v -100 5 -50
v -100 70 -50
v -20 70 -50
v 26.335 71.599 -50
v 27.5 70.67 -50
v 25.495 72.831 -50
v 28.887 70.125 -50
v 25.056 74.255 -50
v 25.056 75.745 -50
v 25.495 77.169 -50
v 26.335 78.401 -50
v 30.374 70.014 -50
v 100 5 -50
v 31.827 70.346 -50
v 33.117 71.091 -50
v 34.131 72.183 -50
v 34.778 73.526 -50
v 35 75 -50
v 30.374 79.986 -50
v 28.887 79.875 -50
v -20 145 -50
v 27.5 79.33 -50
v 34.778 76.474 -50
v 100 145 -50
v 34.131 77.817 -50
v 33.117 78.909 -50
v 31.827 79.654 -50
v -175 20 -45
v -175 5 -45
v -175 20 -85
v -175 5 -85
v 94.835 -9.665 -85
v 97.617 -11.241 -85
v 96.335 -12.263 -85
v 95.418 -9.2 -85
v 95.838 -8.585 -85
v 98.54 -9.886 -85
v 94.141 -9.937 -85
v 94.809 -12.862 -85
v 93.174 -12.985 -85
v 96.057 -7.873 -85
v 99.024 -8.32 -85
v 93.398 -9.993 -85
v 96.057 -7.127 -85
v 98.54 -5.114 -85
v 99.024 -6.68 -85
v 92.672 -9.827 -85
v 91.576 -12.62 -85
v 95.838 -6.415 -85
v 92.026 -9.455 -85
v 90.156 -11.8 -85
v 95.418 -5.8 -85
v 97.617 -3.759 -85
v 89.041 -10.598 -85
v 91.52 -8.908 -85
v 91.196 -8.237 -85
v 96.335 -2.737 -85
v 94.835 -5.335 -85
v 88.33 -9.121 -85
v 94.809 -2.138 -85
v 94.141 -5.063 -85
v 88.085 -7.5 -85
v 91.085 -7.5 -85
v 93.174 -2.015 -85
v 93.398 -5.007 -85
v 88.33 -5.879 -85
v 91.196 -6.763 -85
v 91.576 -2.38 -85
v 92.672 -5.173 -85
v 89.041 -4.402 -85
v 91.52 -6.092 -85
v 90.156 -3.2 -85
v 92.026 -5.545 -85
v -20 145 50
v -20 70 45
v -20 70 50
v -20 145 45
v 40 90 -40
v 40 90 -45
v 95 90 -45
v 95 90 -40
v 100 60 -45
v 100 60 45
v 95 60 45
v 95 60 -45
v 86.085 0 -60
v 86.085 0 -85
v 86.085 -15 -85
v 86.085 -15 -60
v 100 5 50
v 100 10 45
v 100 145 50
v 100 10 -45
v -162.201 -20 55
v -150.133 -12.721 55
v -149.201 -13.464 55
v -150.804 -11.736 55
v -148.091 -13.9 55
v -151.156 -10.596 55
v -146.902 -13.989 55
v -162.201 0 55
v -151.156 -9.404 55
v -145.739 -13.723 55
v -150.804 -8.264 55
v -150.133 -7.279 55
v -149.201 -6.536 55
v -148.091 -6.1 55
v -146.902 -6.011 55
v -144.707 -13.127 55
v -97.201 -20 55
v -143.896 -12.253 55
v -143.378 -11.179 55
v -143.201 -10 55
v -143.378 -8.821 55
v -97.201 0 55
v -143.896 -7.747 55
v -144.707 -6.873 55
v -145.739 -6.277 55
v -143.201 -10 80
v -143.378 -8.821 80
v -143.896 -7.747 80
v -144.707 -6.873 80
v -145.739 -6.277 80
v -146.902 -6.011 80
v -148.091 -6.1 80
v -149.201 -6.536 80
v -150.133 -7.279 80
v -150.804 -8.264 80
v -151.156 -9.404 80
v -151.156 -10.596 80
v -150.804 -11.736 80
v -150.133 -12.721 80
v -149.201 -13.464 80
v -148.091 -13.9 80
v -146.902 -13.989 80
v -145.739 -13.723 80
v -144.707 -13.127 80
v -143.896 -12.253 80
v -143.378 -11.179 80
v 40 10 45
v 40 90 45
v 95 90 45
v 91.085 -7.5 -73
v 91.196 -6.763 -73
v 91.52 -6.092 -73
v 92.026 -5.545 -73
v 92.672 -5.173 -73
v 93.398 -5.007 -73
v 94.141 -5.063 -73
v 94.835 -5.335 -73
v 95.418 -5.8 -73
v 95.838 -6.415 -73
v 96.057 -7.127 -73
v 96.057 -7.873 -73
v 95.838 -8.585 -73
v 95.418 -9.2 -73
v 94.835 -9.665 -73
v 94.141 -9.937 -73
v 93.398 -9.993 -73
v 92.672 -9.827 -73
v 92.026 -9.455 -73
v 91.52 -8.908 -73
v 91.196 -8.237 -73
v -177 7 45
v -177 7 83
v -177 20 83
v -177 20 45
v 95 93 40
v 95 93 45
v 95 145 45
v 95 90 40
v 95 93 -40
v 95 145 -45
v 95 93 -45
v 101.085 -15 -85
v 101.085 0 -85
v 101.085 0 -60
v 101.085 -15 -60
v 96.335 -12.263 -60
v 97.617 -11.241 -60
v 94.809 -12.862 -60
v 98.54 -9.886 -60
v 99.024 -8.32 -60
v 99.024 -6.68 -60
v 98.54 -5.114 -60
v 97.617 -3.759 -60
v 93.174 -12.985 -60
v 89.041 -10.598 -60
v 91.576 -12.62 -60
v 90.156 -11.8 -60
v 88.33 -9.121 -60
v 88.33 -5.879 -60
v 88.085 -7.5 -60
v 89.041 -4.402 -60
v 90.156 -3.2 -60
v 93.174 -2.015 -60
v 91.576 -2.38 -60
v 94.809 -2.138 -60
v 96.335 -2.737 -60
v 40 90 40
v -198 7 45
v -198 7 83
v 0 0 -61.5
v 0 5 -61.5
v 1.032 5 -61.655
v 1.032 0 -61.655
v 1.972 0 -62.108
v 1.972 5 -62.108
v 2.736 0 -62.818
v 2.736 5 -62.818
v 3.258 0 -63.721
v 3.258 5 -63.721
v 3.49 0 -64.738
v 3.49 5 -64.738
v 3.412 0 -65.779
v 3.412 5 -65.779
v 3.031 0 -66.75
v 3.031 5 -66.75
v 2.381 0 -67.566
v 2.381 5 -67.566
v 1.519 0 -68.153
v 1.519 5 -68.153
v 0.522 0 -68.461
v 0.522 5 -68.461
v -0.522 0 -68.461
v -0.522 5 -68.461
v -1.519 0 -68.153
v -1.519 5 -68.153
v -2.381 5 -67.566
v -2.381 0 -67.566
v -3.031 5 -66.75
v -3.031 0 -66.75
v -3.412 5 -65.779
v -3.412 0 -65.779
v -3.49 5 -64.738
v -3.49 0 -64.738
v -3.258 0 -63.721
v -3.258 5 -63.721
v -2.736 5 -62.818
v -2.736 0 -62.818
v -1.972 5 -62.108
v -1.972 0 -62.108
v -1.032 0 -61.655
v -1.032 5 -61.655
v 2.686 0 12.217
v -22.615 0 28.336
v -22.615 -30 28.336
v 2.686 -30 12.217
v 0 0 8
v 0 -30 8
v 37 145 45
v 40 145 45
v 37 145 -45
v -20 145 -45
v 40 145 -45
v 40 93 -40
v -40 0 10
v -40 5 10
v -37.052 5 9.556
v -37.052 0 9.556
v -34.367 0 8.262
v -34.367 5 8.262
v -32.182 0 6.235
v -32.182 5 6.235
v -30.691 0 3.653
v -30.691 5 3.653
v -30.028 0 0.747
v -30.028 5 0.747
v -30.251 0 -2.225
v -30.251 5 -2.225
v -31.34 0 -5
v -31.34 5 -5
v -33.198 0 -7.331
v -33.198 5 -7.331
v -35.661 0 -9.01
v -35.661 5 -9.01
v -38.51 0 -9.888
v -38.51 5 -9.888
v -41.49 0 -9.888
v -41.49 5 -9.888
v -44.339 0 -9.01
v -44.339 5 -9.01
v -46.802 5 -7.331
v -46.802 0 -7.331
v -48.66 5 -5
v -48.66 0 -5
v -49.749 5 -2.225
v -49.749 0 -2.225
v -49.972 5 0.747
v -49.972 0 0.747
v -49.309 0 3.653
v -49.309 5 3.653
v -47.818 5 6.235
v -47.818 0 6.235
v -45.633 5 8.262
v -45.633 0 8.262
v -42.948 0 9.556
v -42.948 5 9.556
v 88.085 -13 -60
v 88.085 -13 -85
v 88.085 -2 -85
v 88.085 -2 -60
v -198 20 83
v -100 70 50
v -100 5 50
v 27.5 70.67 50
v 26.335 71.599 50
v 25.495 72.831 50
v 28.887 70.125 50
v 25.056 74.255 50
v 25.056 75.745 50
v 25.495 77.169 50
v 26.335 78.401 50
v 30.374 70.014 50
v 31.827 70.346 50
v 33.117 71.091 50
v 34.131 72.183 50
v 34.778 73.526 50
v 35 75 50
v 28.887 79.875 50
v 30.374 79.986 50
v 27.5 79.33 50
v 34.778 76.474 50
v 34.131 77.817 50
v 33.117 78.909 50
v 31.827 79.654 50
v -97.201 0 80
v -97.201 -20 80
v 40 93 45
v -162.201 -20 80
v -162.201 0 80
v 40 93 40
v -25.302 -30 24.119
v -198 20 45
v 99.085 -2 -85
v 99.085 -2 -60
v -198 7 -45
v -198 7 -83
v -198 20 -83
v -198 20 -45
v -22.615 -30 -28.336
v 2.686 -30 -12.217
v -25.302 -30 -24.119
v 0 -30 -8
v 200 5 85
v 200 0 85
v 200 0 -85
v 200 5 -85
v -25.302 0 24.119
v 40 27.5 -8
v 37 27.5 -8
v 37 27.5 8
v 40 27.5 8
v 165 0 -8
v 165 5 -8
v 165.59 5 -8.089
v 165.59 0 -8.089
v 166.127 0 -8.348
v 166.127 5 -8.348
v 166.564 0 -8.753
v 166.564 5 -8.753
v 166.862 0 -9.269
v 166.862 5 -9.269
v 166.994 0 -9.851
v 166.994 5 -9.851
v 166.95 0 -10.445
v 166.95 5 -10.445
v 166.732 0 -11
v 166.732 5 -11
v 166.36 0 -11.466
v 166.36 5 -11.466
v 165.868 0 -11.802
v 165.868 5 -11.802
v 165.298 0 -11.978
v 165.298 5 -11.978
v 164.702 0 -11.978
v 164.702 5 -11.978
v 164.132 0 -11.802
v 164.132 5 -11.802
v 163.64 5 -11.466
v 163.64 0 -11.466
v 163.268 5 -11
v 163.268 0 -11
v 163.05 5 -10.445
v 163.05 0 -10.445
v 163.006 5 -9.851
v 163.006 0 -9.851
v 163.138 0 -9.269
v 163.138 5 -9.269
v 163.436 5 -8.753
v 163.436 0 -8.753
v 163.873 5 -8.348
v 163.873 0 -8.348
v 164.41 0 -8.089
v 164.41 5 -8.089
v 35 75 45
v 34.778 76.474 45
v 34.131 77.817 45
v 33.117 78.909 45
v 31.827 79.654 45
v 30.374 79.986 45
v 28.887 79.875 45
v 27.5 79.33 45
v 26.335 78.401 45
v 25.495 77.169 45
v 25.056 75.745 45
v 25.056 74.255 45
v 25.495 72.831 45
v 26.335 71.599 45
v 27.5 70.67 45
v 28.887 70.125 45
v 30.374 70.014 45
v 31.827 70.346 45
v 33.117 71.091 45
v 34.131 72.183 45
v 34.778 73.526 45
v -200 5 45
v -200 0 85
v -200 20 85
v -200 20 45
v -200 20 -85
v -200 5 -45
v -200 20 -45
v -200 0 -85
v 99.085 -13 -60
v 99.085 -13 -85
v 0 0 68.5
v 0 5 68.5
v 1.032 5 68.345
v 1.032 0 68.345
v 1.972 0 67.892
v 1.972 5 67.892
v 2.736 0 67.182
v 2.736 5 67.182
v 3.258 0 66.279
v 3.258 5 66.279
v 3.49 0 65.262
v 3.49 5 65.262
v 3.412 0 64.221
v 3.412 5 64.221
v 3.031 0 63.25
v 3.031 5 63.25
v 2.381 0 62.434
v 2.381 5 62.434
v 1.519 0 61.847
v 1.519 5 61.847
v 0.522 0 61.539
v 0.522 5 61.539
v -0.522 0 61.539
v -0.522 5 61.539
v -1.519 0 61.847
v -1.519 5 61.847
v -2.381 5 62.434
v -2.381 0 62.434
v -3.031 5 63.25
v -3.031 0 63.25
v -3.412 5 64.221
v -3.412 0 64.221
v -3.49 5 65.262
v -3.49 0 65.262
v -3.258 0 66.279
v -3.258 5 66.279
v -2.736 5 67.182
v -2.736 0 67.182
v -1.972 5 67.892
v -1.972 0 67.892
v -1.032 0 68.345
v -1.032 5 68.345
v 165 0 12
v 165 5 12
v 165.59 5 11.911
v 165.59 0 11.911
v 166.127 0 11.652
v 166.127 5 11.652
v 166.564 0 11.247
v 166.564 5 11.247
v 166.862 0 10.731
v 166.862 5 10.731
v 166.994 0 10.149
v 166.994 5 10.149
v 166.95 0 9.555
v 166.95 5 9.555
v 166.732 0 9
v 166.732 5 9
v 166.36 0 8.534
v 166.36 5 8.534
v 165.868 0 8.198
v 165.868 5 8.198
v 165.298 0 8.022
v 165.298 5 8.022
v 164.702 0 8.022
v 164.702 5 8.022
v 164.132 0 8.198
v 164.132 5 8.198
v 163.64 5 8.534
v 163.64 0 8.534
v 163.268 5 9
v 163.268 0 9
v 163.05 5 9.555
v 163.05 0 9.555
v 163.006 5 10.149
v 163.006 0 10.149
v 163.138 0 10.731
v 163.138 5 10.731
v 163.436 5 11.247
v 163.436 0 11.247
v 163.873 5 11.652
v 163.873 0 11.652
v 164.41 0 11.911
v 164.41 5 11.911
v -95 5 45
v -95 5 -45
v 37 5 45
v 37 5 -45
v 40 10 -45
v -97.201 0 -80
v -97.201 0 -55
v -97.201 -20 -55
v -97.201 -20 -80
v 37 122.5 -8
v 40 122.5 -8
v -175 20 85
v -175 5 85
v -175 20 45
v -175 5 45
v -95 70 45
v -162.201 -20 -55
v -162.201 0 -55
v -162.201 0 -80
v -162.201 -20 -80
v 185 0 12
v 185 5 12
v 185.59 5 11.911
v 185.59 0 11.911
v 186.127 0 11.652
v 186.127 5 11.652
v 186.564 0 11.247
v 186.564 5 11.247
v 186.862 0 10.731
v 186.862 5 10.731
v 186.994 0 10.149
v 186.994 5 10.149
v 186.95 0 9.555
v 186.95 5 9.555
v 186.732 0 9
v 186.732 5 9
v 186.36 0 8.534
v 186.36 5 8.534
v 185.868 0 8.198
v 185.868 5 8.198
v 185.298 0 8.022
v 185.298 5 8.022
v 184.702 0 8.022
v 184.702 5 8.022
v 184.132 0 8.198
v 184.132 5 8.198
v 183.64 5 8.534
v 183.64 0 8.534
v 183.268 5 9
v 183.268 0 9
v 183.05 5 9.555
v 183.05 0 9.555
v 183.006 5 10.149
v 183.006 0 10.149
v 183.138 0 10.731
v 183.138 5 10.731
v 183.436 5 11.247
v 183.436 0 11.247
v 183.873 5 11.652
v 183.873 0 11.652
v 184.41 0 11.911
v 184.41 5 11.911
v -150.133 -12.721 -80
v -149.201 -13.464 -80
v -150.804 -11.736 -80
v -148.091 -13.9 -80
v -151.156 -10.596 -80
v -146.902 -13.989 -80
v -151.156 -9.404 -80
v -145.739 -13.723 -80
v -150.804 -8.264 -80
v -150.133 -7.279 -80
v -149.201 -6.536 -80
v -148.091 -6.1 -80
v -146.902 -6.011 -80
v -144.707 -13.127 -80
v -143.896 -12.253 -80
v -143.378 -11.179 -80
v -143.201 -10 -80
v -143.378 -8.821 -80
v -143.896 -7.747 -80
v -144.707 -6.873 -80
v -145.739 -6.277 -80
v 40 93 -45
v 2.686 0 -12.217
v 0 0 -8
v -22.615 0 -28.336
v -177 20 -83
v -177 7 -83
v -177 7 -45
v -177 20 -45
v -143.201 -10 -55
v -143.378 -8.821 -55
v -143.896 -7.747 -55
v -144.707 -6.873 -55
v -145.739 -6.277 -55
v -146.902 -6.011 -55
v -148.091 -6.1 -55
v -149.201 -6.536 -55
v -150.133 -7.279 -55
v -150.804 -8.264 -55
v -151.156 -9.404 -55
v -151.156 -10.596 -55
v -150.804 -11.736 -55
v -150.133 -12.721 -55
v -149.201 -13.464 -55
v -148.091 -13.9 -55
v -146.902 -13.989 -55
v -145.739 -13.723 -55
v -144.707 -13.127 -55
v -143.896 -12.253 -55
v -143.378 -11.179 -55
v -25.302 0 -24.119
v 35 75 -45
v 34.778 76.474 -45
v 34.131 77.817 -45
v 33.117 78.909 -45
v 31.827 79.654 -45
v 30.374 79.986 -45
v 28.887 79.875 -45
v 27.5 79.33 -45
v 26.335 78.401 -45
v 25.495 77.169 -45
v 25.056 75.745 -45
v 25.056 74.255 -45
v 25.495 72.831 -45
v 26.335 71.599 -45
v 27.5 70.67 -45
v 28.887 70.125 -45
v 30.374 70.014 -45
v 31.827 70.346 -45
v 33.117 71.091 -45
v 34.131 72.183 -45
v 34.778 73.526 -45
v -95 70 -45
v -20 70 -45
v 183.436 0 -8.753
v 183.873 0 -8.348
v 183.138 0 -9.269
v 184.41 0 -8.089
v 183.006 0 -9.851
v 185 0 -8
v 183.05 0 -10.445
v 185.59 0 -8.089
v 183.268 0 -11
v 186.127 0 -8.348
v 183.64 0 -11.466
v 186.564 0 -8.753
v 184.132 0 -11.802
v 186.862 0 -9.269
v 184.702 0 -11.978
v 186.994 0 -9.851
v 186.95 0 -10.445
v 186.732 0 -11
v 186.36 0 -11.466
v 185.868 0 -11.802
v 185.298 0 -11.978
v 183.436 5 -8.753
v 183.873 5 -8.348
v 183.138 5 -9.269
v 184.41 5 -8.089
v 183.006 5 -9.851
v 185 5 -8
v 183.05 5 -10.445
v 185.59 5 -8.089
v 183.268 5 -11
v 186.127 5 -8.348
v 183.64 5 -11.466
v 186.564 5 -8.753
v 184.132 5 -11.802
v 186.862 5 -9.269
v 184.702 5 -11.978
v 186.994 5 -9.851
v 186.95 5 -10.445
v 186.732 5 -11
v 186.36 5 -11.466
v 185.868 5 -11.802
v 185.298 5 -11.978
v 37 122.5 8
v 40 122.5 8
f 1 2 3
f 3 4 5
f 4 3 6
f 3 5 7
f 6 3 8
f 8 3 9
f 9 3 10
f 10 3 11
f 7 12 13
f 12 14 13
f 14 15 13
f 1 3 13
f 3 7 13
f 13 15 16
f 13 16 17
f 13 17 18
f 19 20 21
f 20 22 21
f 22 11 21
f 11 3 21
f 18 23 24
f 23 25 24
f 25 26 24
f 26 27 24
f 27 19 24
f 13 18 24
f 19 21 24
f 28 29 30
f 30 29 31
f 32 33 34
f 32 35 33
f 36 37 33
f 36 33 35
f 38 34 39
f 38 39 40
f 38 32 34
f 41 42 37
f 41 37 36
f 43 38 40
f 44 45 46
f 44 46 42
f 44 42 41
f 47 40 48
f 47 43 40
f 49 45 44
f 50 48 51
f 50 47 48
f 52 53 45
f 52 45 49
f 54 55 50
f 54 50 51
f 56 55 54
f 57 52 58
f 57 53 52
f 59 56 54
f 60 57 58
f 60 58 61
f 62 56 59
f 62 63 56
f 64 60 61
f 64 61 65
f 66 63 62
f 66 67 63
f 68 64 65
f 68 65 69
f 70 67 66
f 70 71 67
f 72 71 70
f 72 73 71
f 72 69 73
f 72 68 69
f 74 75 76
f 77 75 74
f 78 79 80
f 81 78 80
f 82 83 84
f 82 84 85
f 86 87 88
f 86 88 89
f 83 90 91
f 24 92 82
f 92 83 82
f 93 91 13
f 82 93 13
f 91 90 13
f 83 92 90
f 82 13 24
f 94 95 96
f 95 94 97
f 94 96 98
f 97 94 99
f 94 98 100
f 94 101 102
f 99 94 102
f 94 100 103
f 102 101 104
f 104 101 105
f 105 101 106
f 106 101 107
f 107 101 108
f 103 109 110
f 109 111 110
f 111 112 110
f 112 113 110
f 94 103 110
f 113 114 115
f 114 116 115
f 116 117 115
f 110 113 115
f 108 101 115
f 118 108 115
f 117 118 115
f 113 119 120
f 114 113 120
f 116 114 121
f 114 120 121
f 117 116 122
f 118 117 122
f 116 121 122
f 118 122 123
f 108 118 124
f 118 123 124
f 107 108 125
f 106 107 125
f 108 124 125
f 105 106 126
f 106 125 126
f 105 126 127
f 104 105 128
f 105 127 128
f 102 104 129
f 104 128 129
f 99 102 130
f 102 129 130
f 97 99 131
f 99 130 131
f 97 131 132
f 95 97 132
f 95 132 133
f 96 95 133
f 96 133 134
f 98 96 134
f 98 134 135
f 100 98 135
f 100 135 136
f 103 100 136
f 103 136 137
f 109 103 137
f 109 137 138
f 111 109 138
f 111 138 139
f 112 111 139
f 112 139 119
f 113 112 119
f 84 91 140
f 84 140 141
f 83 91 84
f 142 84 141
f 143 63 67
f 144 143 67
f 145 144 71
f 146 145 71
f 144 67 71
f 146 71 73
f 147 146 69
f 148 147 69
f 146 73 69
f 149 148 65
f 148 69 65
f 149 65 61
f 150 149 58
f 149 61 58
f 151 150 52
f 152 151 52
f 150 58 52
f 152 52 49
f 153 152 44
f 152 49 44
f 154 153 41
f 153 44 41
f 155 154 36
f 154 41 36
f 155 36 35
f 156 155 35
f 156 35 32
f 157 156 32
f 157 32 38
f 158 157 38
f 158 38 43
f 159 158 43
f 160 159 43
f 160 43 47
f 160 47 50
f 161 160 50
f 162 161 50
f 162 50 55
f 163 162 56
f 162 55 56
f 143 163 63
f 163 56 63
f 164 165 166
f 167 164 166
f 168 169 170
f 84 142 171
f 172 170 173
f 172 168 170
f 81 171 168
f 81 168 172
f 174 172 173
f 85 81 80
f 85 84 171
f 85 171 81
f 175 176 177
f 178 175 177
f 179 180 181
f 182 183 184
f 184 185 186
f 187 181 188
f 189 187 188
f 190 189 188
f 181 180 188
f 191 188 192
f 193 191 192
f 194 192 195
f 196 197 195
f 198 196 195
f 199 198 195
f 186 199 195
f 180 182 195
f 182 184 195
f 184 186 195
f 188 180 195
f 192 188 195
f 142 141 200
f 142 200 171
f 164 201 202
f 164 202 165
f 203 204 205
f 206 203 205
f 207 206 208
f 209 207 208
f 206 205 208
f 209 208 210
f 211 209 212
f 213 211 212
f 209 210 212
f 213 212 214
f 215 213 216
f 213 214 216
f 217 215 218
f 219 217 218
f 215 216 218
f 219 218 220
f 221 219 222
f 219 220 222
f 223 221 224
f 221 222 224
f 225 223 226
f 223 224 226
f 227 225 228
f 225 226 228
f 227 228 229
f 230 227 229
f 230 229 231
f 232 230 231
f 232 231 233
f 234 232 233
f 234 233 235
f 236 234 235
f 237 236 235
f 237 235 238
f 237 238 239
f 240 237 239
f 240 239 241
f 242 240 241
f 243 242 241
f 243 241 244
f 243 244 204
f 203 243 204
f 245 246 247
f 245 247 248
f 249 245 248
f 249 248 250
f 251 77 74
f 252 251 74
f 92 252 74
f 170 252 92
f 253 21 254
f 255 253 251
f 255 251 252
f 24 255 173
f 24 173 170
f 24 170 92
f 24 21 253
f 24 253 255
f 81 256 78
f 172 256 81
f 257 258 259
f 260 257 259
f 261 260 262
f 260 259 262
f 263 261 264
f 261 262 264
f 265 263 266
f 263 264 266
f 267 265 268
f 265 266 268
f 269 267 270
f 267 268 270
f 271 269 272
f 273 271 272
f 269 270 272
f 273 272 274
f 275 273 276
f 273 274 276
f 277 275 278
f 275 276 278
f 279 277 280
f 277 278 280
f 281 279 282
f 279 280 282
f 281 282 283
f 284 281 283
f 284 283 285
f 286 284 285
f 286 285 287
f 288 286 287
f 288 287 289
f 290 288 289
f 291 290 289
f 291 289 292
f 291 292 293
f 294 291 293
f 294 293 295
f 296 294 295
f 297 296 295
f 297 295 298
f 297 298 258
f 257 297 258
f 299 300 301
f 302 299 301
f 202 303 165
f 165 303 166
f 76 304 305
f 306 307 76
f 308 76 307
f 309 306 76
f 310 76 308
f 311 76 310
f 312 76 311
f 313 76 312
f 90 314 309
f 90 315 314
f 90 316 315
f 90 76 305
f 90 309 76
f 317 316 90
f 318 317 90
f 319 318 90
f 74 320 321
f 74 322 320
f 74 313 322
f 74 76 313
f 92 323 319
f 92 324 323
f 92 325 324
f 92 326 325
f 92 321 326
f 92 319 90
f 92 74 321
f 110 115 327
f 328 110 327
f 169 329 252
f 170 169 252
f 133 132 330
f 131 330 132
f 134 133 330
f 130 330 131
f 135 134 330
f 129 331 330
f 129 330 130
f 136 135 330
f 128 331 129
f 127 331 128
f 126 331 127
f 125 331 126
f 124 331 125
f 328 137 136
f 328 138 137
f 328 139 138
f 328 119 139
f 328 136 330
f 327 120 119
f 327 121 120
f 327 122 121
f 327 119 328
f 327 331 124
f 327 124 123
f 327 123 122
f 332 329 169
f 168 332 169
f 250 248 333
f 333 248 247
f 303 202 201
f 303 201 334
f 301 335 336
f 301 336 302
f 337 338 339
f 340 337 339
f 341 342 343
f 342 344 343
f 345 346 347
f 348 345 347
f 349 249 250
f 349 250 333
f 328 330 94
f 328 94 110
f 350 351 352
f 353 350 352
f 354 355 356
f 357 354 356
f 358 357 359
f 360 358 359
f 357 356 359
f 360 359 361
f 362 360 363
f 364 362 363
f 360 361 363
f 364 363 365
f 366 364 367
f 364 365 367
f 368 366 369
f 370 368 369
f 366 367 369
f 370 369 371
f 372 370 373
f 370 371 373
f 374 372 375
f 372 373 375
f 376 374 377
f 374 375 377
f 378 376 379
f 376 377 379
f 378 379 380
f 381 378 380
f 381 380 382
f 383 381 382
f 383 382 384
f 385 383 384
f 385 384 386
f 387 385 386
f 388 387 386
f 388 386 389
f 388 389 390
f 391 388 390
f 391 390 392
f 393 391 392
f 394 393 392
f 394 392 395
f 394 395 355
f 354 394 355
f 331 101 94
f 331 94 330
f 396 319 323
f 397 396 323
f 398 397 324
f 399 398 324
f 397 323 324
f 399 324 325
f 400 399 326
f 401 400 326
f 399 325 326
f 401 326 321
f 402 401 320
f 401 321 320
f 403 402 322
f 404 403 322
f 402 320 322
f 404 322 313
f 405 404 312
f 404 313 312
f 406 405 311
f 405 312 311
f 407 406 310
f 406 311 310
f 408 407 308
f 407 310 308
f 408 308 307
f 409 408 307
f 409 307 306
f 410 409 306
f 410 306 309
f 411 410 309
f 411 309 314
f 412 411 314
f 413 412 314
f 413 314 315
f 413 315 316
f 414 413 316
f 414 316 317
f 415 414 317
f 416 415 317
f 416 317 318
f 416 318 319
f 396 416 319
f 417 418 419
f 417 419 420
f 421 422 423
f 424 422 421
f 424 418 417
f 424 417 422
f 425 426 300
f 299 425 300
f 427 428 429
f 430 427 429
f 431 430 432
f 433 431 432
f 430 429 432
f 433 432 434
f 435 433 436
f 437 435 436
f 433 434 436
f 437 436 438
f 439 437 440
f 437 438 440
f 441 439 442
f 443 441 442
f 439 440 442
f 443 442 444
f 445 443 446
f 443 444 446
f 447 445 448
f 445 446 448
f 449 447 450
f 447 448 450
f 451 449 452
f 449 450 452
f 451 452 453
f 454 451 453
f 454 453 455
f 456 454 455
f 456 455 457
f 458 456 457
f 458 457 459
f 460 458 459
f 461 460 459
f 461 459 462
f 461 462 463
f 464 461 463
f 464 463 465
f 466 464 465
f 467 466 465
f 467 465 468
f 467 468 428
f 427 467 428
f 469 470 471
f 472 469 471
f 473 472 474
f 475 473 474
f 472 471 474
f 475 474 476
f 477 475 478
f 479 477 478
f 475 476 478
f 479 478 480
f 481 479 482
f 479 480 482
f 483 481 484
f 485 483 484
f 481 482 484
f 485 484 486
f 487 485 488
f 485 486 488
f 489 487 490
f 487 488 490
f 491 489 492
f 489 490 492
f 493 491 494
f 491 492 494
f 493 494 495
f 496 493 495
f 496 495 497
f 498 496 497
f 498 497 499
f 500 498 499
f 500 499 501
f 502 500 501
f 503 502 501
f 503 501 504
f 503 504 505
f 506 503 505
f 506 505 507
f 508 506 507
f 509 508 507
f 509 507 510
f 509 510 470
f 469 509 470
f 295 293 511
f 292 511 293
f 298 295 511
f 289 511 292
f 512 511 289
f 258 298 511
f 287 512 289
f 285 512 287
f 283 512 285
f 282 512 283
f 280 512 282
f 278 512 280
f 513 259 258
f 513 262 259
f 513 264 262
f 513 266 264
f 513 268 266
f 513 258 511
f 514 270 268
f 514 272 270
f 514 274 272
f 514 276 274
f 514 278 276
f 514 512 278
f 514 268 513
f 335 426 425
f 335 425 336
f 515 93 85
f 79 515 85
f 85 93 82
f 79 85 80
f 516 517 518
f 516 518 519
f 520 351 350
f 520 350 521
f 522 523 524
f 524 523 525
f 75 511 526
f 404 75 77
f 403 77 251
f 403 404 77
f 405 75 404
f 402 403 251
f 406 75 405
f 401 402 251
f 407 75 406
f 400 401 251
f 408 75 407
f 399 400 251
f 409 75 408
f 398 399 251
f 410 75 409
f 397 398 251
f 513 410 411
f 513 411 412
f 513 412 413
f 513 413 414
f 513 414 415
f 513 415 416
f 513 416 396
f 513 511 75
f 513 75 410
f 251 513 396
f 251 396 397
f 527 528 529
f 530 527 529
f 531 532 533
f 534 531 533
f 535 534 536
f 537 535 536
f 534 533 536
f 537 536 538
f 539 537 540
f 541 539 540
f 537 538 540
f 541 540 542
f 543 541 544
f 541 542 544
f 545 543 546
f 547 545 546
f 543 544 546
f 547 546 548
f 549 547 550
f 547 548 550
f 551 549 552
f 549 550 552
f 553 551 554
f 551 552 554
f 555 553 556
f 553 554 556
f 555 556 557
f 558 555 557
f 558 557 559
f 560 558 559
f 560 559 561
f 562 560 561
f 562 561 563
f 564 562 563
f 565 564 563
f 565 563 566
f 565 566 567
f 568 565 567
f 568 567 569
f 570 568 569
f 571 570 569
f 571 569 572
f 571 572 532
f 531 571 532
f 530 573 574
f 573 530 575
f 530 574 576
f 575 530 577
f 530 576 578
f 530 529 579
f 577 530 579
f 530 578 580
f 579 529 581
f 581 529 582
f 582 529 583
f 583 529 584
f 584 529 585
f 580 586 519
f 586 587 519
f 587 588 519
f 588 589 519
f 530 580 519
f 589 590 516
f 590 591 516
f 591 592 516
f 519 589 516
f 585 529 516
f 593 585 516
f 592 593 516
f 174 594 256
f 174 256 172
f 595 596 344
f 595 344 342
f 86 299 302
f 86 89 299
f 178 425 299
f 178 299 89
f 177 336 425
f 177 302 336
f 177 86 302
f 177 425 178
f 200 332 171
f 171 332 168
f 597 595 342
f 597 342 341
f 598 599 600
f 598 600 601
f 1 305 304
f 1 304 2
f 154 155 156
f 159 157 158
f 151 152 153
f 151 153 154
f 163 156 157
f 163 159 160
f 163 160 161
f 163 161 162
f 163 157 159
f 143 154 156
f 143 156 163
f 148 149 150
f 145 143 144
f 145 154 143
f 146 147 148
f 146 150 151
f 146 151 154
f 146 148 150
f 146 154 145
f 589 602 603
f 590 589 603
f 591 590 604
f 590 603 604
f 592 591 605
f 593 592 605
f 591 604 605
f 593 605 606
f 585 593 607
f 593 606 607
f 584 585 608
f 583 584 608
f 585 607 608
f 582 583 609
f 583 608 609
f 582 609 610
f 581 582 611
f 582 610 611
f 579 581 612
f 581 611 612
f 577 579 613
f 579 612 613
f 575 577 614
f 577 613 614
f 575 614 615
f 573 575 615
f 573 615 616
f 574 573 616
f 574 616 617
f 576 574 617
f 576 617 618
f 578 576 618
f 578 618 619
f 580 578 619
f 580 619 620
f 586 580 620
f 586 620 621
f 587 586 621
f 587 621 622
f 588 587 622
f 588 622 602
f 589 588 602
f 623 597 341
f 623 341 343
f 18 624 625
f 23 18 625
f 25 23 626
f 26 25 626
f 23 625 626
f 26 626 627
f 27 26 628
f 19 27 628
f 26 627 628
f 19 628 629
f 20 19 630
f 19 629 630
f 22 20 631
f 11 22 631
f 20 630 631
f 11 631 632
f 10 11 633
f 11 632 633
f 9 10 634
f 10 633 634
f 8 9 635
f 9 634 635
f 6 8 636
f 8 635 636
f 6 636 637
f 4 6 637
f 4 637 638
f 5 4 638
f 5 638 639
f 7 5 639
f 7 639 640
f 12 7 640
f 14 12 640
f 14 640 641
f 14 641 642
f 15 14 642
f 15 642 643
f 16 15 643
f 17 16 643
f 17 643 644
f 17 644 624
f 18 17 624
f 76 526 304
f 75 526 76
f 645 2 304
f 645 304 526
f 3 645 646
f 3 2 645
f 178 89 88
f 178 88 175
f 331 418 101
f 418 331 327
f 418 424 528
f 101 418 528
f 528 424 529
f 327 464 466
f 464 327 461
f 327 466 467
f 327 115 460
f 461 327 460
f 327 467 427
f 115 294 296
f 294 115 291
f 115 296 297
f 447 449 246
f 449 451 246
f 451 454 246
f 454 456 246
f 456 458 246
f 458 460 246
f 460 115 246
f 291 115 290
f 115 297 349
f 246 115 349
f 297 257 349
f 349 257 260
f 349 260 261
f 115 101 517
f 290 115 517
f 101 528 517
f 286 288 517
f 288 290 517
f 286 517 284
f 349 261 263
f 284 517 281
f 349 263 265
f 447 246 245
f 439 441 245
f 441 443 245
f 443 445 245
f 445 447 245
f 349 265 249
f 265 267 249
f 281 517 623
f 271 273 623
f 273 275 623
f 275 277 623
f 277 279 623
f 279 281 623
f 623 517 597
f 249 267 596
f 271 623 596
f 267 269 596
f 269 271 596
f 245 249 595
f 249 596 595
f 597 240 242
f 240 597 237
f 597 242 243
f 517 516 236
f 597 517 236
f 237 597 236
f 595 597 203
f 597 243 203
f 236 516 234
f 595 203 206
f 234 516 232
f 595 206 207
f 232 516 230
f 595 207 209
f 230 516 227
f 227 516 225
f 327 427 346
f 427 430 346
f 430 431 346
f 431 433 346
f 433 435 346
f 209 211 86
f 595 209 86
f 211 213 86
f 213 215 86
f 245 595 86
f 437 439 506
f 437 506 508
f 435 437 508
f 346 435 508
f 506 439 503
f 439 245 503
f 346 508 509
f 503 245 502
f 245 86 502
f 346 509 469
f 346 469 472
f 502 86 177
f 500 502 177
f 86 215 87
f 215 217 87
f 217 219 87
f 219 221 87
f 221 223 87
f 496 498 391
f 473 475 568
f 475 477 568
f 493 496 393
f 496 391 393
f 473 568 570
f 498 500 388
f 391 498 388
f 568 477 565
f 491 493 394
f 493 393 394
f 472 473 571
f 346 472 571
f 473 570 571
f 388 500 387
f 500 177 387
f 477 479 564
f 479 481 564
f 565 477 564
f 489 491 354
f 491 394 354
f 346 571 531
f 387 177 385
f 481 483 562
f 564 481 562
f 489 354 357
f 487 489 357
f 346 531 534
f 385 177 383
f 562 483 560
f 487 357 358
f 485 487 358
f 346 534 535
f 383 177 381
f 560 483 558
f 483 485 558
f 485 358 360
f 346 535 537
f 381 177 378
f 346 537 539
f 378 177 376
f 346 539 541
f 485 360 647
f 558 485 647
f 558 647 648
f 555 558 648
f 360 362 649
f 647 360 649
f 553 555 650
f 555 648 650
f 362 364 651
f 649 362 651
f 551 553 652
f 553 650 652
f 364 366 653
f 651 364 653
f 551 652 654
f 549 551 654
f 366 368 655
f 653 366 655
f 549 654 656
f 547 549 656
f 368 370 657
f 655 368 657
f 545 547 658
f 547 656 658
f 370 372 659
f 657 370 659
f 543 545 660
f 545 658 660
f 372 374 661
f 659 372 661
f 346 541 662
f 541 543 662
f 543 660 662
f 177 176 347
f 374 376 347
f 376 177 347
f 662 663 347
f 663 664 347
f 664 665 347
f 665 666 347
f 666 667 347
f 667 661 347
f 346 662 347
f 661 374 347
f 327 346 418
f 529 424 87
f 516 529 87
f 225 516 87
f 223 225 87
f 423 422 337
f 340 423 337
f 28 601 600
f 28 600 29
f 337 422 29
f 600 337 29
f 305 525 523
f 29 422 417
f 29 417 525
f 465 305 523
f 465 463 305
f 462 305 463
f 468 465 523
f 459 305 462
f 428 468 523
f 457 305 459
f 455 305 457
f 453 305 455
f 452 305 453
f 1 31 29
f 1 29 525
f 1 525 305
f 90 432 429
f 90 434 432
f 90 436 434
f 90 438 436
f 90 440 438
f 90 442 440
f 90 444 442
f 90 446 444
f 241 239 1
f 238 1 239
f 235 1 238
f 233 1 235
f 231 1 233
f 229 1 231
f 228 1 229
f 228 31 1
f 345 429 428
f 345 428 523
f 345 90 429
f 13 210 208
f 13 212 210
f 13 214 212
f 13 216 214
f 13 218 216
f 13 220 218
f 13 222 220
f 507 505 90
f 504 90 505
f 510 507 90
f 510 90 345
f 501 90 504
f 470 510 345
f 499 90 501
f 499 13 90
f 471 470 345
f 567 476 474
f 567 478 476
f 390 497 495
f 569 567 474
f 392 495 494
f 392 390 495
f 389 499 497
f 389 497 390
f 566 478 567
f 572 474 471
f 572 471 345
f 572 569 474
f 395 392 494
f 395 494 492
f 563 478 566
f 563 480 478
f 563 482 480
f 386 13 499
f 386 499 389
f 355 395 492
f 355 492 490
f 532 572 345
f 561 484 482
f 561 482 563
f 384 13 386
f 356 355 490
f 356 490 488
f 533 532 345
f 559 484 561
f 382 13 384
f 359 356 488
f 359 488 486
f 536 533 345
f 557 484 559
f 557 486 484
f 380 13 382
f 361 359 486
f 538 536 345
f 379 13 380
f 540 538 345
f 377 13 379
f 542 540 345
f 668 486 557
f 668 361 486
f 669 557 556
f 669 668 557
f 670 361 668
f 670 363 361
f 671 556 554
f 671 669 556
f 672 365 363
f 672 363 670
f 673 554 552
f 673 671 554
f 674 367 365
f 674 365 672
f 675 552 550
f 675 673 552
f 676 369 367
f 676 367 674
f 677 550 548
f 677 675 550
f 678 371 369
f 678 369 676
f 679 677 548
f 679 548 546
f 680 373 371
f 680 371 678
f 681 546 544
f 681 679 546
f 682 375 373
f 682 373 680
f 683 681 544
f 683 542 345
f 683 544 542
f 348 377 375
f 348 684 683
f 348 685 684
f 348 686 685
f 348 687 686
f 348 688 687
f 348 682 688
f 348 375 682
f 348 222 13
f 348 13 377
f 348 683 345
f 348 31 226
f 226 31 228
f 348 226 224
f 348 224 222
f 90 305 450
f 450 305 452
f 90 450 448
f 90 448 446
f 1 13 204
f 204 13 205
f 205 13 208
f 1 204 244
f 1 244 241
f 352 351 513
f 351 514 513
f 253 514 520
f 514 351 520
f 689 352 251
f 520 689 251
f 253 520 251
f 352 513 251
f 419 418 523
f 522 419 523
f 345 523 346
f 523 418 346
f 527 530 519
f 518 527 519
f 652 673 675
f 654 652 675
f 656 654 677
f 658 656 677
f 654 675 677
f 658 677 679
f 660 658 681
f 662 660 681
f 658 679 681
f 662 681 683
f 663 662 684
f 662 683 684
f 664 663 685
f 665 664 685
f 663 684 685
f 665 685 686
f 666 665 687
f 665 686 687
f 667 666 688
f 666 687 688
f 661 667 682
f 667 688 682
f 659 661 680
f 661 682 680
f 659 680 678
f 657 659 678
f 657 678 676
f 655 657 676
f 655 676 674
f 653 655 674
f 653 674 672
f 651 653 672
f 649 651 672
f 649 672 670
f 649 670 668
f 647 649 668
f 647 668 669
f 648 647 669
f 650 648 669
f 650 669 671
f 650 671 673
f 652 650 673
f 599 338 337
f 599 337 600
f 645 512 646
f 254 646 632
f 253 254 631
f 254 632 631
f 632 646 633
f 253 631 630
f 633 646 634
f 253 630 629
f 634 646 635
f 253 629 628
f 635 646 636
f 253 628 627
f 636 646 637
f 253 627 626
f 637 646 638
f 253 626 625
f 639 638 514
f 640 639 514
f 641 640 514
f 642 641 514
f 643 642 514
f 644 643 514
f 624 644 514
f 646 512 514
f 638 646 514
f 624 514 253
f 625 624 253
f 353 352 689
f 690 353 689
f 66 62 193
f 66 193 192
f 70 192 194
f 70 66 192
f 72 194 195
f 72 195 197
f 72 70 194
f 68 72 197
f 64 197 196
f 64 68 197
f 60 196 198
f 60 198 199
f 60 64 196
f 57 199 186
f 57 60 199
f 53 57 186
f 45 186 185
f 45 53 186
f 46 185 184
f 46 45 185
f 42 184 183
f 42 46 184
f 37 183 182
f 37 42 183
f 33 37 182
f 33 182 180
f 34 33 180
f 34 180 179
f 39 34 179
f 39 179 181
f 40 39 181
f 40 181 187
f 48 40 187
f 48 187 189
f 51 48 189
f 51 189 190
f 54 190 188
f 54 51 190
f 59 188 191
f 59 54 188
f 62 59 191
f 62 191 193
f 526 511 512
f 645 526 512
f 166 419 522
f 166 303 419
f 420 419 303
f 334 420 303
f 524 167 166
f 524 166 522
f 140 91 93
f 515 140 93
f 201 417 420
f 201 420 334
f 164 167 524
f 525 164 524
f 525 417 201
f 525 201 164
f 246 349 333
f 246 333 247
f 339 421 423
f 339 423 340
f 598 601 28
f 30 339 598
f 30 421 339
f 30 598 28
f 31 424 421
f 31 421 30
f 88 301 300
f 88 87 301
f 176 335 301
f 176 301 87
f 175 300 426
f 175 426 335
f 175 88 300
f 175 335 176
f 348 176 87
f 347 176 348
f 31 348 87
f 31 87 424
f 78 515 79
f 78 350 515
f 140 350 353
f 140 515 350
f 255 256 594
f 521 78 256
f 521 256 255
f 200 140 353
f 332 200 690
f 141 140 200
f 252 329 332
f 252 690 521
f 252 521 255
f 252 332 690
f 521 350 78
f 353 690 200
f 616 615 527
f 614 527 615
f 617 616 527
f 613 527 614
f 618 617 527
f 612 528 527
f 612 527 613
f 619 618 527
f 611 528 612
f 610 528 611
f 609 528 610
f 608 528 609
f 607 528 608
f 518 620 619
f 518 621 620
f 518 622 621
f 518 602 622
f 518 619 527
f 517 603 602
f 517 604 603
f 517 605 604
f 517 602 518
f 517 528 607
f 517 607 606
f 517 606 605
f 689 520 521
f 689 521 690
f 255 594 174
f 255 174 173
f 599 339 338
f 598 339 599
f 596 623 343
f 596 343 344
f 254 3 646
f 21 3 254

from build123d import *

# Parameters (mm, degrees)
SKETCH1_W                = 400
SKETCH1_H                = 170
BOSS_EXTRUDE1_DEPTH      = 5
SKETCH2_W                = 200
SKETCH2_H                = 100
BOSS_EXTRUDE2_DEPTH      = 140
SHELL1_START             = 5
SHELL1_OUTLINE_W         = 190
SHELL1_OUTLINE_H         = 90
SHELL1_DEPTH             = 140
CUT_EXTRUDE1_DEPTH       = 282.513765205
CUT_EXTRUDE1_DEPTH_BACK  = 282.513765205
SKETCH3_W                = 80
SKETCH3_H                = 75
SKETCH4_R                = 10
CUT_EXTRUDE2_DEPTH       = 140
SKETCH5_W                = 3
SKETCH5_H                = 140
BOSS_EXTRUDE3_DEPTH      = 95
CUT_EXTRUDE3_REACH       = 292.549
SKETCH6_W                = 16
SKETCH6_H                = 95
SKETCH7_R                = 5
CUT_EXTRUDE4_DEPTH       = 140
SKETCH8_W                = 65
SKETCH8_H                = 25
BOSS_EXTRUDE4_DEPTH      = 20
SKETCH9_R                = 2
CUT_EXTRUDE5_DEPTH       = 20
SKETCH21_R               = 3.5
CUT_EXTRUDE9_DEPTH       = 259.505319094
CUT_EXTRUDE10_REACH      = 299.069
SKETCH22_R               = 4
SKETCH35_W               = 90
SKETCH35_H               = 50
CUT_EXTRUDE14_DEPTH      = 15
SKETCH36_W               = 100
SKETCH36_H               = 5
BOSS_EXTRUDE17_DEPTH     = 60
SKETCH38_W               = 25
SKETCH38_H               = 40
BOSS_EXTRUDE19_DEPTH     = 15
CUT_EXTRUDE15_DEPTH      = 128
CUT_EXTRUDE15_DEPTH_BACK = 38
SKETCH39_W               = 21
SKETCH39_H               = 13
SKETCH41_W               = 55
SKETCH41_H               = 3
BOSS_EXTRUDE20_DEPTH     = 10
BOSS_EXTRUDE21_DEPTH     = 30
SKETCH43_W               = 15
SKETCH43_H               = 25
BOSS_EXTRUDE22_DEPTH     = 15
CUT_EXTRUDE16_REACH      = 301.875
SKETCH44_W               = 11
SKETCH44_H               = 11
SKETCH45_R               = 5.5
BOSS_EXTRUDE23_DEPTH     = 25
SKETCH46_R               = 2.5
CUT_EXTRUDE17_DEPTH      = 12


# Read off the part's stored shape, not the designer's step: Shell1
with BuildPart() as part:
    # Sketch1 → Boss-Extrude1 (new body)
    with BuildSketch(Plane(origin=(0, 0, 0), x_dir=(1, 0, 0), z_dir=(0, 1, 0))):
        Rectangle(SKETCH1_W, SKETCH1_H)
    extrude(amount=BOSS_EXTRUDE1_DEPTH)

    # Sketch2 → Boss-Extrude2 (add)
    with BuildSketch(Plane(origin=(0, 5, 0), x_dir=(1, 0, 0), z_dir=(0, 1, 0))):
        Rectangle(SKETCH2_W, SKETCH2_H)
    extrude(amount=BOSS_EXTRUDE2_DEPTH)

    # Shell1 outline → Shell1 (cut)
    with BuildSketch(Plane(origin=(0, 0, 0), x_dir=(1, 0, 0), z_dir=(0, 1, 0)).offset(SHELL1_START)):
        Rectangle(SHELL1_OUTLINE_W, SHELL1_OUTLINE_H)
    extrude(amount=SHELL1_DEPTH, mode=Mode.SUBTRACT)

    # Sketch3 → Cut-Extrude1 (cut, two sides: drawn at the far end of the back side and taken through both)
    with BuildSketch(Plane.XY.offset(50).offset(-CUT_EXTRUDE1_DEPTH_BACK)):
        with Locations((-60, 107.5)):
            Rectangle(SKETCH3_W, SKETCH3_H)
    extrude(amount=CUT_EXTRUDE1_DEPTH + CUT_EXTRUDE1_DEPTH_BACK, mode=Mode.SUBTRACT)

    # Sketch4 → Cut-Extrude2 (cut)
    with BuildSketch(Plane(origin=(0, 5, 0), x_dir=(1, 0, 0), z_dir=(0, 1, 0))):
        with Locations(Location((-40, 0, 0), (0, 0, 270))):
            Circle(SKETCH4_R)
    extrude(amount=-CUT_EXTRUDE2_DEPTH, mode=Mode.SUBTRACT)

    # Sketch5 → Boss-Extrude3 (add)
    with BuildSketch(Plane.XY.offset(50)):
        with Locations((38.5, 75)):
            Rectangle(SKETCH5_W, SKETCH5_H)
    extrude(amount=-BOSS_EXTRUDE3_DEPTH)

    # Sketch6 → Cut-Extrude3 (cut, up to next)
    with BuildSketch(Plane.ZY.offset(-37), mode=Mode.PRIVATE) as cut_extrude3_sk1:
        with Locations((0, 75)):
            Rectangle(SKETCH6_W, SKETCH6_H)
    cut_extrude3_tool1 = extrude(cut_extrude3_sk1.sketch, amount=-CUT_EXTRUDE3_REACH, mode=Mode.PRIVATE) & part.part
    add(cut_extrude3_tool1.solids().sort_by_distance((37, 75, 0))[0], mode=Mode.SUBTRACT)

    # Sketch7 → Cut-Extrude4 (cut)
    with BuildSketch(Plane.XY.offset(50)):
        with Locations((30, 75)):
            Circle(SKETCH7_R)
    extrude(amount=-CUT_EXTRUDE4_DEPTH, mode=Mode.SUBTRACT)

    # Sketch8 → Boss-Extrude4 (add)
    with BuildSketch(Plane.XZ):
        with Locations((-129.700529479, 67.5)):
            Rectangle(SKETCH8_W, SKETCH8_H)
    boss_extrude4 = extrude(amount=BOSS_EXTRUDE4_DEPTH)

    # Mirror1: Boss-Extrude4 across plane
    add(boss_extrude4.mirror(Plane.XY))

    # Sketch9 → Cut-Extrude5 (cut)
    with BuildSketch(Plane(origin=(0, 5, 0), x_dir=(1, 0, 0), z_dir=(0, 1, 0))):
        with Locations(Location((185, 10, 0), (0, 0, 270))):
            Circle(SKETCH9_R)
        with Locations(Location((185, -10, 0), (0, 0, 270))):
            Circle(SKETCH9_R)
        with Locations(Location((165, -10, 0), (0, 0, 270))):
            Circle(SKETCH9_R)
        with Locations(Location((165, 10, 0), (0, 0, 270))):
            Circle(SKETCH9_R)
    extrude(amount=-CUT_EXTRUDE5_DEPTH, mode=Mode.SUBTRACT)

    # Sketch21 → Cut-Extrude9 (cut, through all)
    with BuildSketch(Plane(origin=(0, 5, 0), x_dir=(1, 0, 0), z_dir=(0, 1, 0))):
        with Locations(Location((0, 65, 0), (0, 0, 270))):
            Circle(SKETCH21_R)
        with Locations(Location((0, -65, 0), (0, 0, 270))):
            Circle(SKETCH21_R)
    extrude(amount=-CUT_EXTRUDE9_DEPTH, mode=Mode.SUBTRACT)

    # Cut-Extrude10: up to this face of the body (flat: up to its plane)
    cut_extrude10_end = Plane(part.part.faces().sort_by_distance((-129.700529479, -10, -80))[0])
    # Sketch22 → Cut-Extrude10 (cut, up to the picked face)
    with BuildSketch(Plane.XY.offset(80), mode=Mode.PRIVATE) as cut_extrude10_sk1:
        with Locations((-147.200529479, -10)):
            Circle(SKETCH22_R)
    cut_extrude10_tool1 = split(extrude(cut_extrude10_sk1.sketch, amount=-CUT_EXTRUDE10_REACH, mode=Mode.PRIVATE), bisect_by=cut_extrude10_end, keep=Keep.BOTH, mode=Mode.PRIVATE)
    add(cut_extrude10_tool1.solids().sort_by(Axis((-147.200529, -10, 80), (0, 0, -1)))[0], mode=Mode.SUBTRACT)

    # Sketch35 → Cut-Extrude14 (cut)
    with BuildSketch(Plane(origin=(100, 0, 0), x_dir=(0, 0, -1), z_dir=(1, 0, 0))):
        with Locations((0, 35)):
            Rectangle(SKETCH35_W, SKETCH35_H)
    extrude(amount=-CUT_EXTRUDE14_DEPTH, mode=Mode.SUBTRACT)

    # Sketch36 → Boss-Extrude17 (add)
    with BuildSketch(Plane(origin=(100, 0, 0), x_dir=(0, 0, -1), z_dir=(1, 0, 0))):
        with Locations((0, 7.5)):
            Rectangle(SKETCH36_W, SKETCH36_H)
    extrude(amount=-BOSS_EXTRUDE17_DEPTH)

    # Sketch38 → Boss-Extrude19 (add)
    with BuildSketch(Plane(origin=(0, 5, 0), x_dir=(1, 0, 0), z_dir=(0, 1, 0))):
        with Locations((-187.5, 65)):
            Rectangle(SKETCH38_W, SKETCH38_H)
        with Locations((-187.5, -65)):
            Rectangle(SKETCH38_W, SKETCH38_H)
    extrude(amount=BOSS_EXTRUDE19_DEPTH)

    # Sketch39 → Cut-Extrude15 (cut, two sides: drawn at the far end of the back side and taken through both)
    with BuildSketch(Plane.XY.offset(-45).offset(-CUT_EXTRUDE15_DEPTH_BACK)):
        with Locations((-187.5, 13.5)):
            Rectangle(SKETCH39_W, SKETCH39_H)
    extrude(amount=CUT_EXTRUDE15_DEPTH + CUT_EXTRUDE15_DEPTH_BACK, mode=Mode.SUBTRACT)

    # Sketch41 → Boss-Extrude20 (add)
    with BuildSketch(Plane.XY.offset(50)):
        with Locations((67.5, 91.5)):
            Rectangle(SKETCH41_W, SKETCH41_H)
    boss_extrude20 = extrude(amount=-BOSS_EXTRUDE20_DEPTH)

    # Mirror2: Boss-Extrude20 across plane
    add(boss_extrude20.mirror(Plane.XY))

    # Sketch42 → Boss-Extrude21 (add)
    with BuildSketch(Plane.XZ):
        Polygon((-22.615245333, 28.335945479), (2.686498042, 12.216957229), (0, 8), (-25.301743374, 24.11898825), align=None)
        Polygon((2.686498042, -12.216957229), (-22.615245333, -28.335945479), (-25.301743374, -24.11898825), (0, -8), align=None)
    extrude(amount=BOSS_EXTRUDE21_DEPTH)

    # Sketch43 → Boss-Extrude22 (add)
    with BuildSketch(Plane.XZ):
        with Locations((93.585171048, -72.5)):
            Rectangle(SKETCH43_W, SKETCH43_H)
    extrude(amount=BOSS_EXTRUDE22_DEPTH)

    # Sketch44 → Cut-Extrude16 (cut, up to next)
    with BuildSketch(Plane(origin=(0, 0, -85), x_dir=(-1, 0, 0), z_dir=(0, 0, -1)), mode=Mode.PRIVATE) as cut_extrude16_sk1:
        with Locations((-93.585171048, -7.5)):
            Rectangle(SKETCH44_W, SKETCH44_H)
    cut_extrude16_tool1 = extrude(cut_extrude16_sk1.sketch, amount=-CUT_EXTRUDE16_REACH, mode=Mode.PRIVATE) & part.part
    add(cut_extrude16_tool1.solids().sort_by_distance((93.585171, -7.5, -85))[0], mode=Mode.SUBTRACT)


with BuildPart() as body_2:
    # Sketch45 → Boss-Extrude23 (new body)
    with BuildSketch(Plane(origin=(0, 0, -85), x_dir=(-1, 0, 0), z_dir=(0, 0, -1))):
        with Locations((-93.585171048, -7.5)):
            Circle(SKETCH45_R)
    extrude(amount=-BOSS_EXTRUDE23_DEPTH)

    # Sketch46 → Cut-Extrude17 (cut)
    with BuildSketch(Plane(origin=(0, 0, -85), x_dir=(-1, 0, 0), z_dir=(0, 0, -1))):
        with Locations((-93.585171048, -7.5)):
            Circle(SKETCH46_R)
    extrude(amount=-CUT_EXTRUDE17_DEPTH, mode=Mode.SUBTRACT)


solid = Compound([part.part, body_2.part])
